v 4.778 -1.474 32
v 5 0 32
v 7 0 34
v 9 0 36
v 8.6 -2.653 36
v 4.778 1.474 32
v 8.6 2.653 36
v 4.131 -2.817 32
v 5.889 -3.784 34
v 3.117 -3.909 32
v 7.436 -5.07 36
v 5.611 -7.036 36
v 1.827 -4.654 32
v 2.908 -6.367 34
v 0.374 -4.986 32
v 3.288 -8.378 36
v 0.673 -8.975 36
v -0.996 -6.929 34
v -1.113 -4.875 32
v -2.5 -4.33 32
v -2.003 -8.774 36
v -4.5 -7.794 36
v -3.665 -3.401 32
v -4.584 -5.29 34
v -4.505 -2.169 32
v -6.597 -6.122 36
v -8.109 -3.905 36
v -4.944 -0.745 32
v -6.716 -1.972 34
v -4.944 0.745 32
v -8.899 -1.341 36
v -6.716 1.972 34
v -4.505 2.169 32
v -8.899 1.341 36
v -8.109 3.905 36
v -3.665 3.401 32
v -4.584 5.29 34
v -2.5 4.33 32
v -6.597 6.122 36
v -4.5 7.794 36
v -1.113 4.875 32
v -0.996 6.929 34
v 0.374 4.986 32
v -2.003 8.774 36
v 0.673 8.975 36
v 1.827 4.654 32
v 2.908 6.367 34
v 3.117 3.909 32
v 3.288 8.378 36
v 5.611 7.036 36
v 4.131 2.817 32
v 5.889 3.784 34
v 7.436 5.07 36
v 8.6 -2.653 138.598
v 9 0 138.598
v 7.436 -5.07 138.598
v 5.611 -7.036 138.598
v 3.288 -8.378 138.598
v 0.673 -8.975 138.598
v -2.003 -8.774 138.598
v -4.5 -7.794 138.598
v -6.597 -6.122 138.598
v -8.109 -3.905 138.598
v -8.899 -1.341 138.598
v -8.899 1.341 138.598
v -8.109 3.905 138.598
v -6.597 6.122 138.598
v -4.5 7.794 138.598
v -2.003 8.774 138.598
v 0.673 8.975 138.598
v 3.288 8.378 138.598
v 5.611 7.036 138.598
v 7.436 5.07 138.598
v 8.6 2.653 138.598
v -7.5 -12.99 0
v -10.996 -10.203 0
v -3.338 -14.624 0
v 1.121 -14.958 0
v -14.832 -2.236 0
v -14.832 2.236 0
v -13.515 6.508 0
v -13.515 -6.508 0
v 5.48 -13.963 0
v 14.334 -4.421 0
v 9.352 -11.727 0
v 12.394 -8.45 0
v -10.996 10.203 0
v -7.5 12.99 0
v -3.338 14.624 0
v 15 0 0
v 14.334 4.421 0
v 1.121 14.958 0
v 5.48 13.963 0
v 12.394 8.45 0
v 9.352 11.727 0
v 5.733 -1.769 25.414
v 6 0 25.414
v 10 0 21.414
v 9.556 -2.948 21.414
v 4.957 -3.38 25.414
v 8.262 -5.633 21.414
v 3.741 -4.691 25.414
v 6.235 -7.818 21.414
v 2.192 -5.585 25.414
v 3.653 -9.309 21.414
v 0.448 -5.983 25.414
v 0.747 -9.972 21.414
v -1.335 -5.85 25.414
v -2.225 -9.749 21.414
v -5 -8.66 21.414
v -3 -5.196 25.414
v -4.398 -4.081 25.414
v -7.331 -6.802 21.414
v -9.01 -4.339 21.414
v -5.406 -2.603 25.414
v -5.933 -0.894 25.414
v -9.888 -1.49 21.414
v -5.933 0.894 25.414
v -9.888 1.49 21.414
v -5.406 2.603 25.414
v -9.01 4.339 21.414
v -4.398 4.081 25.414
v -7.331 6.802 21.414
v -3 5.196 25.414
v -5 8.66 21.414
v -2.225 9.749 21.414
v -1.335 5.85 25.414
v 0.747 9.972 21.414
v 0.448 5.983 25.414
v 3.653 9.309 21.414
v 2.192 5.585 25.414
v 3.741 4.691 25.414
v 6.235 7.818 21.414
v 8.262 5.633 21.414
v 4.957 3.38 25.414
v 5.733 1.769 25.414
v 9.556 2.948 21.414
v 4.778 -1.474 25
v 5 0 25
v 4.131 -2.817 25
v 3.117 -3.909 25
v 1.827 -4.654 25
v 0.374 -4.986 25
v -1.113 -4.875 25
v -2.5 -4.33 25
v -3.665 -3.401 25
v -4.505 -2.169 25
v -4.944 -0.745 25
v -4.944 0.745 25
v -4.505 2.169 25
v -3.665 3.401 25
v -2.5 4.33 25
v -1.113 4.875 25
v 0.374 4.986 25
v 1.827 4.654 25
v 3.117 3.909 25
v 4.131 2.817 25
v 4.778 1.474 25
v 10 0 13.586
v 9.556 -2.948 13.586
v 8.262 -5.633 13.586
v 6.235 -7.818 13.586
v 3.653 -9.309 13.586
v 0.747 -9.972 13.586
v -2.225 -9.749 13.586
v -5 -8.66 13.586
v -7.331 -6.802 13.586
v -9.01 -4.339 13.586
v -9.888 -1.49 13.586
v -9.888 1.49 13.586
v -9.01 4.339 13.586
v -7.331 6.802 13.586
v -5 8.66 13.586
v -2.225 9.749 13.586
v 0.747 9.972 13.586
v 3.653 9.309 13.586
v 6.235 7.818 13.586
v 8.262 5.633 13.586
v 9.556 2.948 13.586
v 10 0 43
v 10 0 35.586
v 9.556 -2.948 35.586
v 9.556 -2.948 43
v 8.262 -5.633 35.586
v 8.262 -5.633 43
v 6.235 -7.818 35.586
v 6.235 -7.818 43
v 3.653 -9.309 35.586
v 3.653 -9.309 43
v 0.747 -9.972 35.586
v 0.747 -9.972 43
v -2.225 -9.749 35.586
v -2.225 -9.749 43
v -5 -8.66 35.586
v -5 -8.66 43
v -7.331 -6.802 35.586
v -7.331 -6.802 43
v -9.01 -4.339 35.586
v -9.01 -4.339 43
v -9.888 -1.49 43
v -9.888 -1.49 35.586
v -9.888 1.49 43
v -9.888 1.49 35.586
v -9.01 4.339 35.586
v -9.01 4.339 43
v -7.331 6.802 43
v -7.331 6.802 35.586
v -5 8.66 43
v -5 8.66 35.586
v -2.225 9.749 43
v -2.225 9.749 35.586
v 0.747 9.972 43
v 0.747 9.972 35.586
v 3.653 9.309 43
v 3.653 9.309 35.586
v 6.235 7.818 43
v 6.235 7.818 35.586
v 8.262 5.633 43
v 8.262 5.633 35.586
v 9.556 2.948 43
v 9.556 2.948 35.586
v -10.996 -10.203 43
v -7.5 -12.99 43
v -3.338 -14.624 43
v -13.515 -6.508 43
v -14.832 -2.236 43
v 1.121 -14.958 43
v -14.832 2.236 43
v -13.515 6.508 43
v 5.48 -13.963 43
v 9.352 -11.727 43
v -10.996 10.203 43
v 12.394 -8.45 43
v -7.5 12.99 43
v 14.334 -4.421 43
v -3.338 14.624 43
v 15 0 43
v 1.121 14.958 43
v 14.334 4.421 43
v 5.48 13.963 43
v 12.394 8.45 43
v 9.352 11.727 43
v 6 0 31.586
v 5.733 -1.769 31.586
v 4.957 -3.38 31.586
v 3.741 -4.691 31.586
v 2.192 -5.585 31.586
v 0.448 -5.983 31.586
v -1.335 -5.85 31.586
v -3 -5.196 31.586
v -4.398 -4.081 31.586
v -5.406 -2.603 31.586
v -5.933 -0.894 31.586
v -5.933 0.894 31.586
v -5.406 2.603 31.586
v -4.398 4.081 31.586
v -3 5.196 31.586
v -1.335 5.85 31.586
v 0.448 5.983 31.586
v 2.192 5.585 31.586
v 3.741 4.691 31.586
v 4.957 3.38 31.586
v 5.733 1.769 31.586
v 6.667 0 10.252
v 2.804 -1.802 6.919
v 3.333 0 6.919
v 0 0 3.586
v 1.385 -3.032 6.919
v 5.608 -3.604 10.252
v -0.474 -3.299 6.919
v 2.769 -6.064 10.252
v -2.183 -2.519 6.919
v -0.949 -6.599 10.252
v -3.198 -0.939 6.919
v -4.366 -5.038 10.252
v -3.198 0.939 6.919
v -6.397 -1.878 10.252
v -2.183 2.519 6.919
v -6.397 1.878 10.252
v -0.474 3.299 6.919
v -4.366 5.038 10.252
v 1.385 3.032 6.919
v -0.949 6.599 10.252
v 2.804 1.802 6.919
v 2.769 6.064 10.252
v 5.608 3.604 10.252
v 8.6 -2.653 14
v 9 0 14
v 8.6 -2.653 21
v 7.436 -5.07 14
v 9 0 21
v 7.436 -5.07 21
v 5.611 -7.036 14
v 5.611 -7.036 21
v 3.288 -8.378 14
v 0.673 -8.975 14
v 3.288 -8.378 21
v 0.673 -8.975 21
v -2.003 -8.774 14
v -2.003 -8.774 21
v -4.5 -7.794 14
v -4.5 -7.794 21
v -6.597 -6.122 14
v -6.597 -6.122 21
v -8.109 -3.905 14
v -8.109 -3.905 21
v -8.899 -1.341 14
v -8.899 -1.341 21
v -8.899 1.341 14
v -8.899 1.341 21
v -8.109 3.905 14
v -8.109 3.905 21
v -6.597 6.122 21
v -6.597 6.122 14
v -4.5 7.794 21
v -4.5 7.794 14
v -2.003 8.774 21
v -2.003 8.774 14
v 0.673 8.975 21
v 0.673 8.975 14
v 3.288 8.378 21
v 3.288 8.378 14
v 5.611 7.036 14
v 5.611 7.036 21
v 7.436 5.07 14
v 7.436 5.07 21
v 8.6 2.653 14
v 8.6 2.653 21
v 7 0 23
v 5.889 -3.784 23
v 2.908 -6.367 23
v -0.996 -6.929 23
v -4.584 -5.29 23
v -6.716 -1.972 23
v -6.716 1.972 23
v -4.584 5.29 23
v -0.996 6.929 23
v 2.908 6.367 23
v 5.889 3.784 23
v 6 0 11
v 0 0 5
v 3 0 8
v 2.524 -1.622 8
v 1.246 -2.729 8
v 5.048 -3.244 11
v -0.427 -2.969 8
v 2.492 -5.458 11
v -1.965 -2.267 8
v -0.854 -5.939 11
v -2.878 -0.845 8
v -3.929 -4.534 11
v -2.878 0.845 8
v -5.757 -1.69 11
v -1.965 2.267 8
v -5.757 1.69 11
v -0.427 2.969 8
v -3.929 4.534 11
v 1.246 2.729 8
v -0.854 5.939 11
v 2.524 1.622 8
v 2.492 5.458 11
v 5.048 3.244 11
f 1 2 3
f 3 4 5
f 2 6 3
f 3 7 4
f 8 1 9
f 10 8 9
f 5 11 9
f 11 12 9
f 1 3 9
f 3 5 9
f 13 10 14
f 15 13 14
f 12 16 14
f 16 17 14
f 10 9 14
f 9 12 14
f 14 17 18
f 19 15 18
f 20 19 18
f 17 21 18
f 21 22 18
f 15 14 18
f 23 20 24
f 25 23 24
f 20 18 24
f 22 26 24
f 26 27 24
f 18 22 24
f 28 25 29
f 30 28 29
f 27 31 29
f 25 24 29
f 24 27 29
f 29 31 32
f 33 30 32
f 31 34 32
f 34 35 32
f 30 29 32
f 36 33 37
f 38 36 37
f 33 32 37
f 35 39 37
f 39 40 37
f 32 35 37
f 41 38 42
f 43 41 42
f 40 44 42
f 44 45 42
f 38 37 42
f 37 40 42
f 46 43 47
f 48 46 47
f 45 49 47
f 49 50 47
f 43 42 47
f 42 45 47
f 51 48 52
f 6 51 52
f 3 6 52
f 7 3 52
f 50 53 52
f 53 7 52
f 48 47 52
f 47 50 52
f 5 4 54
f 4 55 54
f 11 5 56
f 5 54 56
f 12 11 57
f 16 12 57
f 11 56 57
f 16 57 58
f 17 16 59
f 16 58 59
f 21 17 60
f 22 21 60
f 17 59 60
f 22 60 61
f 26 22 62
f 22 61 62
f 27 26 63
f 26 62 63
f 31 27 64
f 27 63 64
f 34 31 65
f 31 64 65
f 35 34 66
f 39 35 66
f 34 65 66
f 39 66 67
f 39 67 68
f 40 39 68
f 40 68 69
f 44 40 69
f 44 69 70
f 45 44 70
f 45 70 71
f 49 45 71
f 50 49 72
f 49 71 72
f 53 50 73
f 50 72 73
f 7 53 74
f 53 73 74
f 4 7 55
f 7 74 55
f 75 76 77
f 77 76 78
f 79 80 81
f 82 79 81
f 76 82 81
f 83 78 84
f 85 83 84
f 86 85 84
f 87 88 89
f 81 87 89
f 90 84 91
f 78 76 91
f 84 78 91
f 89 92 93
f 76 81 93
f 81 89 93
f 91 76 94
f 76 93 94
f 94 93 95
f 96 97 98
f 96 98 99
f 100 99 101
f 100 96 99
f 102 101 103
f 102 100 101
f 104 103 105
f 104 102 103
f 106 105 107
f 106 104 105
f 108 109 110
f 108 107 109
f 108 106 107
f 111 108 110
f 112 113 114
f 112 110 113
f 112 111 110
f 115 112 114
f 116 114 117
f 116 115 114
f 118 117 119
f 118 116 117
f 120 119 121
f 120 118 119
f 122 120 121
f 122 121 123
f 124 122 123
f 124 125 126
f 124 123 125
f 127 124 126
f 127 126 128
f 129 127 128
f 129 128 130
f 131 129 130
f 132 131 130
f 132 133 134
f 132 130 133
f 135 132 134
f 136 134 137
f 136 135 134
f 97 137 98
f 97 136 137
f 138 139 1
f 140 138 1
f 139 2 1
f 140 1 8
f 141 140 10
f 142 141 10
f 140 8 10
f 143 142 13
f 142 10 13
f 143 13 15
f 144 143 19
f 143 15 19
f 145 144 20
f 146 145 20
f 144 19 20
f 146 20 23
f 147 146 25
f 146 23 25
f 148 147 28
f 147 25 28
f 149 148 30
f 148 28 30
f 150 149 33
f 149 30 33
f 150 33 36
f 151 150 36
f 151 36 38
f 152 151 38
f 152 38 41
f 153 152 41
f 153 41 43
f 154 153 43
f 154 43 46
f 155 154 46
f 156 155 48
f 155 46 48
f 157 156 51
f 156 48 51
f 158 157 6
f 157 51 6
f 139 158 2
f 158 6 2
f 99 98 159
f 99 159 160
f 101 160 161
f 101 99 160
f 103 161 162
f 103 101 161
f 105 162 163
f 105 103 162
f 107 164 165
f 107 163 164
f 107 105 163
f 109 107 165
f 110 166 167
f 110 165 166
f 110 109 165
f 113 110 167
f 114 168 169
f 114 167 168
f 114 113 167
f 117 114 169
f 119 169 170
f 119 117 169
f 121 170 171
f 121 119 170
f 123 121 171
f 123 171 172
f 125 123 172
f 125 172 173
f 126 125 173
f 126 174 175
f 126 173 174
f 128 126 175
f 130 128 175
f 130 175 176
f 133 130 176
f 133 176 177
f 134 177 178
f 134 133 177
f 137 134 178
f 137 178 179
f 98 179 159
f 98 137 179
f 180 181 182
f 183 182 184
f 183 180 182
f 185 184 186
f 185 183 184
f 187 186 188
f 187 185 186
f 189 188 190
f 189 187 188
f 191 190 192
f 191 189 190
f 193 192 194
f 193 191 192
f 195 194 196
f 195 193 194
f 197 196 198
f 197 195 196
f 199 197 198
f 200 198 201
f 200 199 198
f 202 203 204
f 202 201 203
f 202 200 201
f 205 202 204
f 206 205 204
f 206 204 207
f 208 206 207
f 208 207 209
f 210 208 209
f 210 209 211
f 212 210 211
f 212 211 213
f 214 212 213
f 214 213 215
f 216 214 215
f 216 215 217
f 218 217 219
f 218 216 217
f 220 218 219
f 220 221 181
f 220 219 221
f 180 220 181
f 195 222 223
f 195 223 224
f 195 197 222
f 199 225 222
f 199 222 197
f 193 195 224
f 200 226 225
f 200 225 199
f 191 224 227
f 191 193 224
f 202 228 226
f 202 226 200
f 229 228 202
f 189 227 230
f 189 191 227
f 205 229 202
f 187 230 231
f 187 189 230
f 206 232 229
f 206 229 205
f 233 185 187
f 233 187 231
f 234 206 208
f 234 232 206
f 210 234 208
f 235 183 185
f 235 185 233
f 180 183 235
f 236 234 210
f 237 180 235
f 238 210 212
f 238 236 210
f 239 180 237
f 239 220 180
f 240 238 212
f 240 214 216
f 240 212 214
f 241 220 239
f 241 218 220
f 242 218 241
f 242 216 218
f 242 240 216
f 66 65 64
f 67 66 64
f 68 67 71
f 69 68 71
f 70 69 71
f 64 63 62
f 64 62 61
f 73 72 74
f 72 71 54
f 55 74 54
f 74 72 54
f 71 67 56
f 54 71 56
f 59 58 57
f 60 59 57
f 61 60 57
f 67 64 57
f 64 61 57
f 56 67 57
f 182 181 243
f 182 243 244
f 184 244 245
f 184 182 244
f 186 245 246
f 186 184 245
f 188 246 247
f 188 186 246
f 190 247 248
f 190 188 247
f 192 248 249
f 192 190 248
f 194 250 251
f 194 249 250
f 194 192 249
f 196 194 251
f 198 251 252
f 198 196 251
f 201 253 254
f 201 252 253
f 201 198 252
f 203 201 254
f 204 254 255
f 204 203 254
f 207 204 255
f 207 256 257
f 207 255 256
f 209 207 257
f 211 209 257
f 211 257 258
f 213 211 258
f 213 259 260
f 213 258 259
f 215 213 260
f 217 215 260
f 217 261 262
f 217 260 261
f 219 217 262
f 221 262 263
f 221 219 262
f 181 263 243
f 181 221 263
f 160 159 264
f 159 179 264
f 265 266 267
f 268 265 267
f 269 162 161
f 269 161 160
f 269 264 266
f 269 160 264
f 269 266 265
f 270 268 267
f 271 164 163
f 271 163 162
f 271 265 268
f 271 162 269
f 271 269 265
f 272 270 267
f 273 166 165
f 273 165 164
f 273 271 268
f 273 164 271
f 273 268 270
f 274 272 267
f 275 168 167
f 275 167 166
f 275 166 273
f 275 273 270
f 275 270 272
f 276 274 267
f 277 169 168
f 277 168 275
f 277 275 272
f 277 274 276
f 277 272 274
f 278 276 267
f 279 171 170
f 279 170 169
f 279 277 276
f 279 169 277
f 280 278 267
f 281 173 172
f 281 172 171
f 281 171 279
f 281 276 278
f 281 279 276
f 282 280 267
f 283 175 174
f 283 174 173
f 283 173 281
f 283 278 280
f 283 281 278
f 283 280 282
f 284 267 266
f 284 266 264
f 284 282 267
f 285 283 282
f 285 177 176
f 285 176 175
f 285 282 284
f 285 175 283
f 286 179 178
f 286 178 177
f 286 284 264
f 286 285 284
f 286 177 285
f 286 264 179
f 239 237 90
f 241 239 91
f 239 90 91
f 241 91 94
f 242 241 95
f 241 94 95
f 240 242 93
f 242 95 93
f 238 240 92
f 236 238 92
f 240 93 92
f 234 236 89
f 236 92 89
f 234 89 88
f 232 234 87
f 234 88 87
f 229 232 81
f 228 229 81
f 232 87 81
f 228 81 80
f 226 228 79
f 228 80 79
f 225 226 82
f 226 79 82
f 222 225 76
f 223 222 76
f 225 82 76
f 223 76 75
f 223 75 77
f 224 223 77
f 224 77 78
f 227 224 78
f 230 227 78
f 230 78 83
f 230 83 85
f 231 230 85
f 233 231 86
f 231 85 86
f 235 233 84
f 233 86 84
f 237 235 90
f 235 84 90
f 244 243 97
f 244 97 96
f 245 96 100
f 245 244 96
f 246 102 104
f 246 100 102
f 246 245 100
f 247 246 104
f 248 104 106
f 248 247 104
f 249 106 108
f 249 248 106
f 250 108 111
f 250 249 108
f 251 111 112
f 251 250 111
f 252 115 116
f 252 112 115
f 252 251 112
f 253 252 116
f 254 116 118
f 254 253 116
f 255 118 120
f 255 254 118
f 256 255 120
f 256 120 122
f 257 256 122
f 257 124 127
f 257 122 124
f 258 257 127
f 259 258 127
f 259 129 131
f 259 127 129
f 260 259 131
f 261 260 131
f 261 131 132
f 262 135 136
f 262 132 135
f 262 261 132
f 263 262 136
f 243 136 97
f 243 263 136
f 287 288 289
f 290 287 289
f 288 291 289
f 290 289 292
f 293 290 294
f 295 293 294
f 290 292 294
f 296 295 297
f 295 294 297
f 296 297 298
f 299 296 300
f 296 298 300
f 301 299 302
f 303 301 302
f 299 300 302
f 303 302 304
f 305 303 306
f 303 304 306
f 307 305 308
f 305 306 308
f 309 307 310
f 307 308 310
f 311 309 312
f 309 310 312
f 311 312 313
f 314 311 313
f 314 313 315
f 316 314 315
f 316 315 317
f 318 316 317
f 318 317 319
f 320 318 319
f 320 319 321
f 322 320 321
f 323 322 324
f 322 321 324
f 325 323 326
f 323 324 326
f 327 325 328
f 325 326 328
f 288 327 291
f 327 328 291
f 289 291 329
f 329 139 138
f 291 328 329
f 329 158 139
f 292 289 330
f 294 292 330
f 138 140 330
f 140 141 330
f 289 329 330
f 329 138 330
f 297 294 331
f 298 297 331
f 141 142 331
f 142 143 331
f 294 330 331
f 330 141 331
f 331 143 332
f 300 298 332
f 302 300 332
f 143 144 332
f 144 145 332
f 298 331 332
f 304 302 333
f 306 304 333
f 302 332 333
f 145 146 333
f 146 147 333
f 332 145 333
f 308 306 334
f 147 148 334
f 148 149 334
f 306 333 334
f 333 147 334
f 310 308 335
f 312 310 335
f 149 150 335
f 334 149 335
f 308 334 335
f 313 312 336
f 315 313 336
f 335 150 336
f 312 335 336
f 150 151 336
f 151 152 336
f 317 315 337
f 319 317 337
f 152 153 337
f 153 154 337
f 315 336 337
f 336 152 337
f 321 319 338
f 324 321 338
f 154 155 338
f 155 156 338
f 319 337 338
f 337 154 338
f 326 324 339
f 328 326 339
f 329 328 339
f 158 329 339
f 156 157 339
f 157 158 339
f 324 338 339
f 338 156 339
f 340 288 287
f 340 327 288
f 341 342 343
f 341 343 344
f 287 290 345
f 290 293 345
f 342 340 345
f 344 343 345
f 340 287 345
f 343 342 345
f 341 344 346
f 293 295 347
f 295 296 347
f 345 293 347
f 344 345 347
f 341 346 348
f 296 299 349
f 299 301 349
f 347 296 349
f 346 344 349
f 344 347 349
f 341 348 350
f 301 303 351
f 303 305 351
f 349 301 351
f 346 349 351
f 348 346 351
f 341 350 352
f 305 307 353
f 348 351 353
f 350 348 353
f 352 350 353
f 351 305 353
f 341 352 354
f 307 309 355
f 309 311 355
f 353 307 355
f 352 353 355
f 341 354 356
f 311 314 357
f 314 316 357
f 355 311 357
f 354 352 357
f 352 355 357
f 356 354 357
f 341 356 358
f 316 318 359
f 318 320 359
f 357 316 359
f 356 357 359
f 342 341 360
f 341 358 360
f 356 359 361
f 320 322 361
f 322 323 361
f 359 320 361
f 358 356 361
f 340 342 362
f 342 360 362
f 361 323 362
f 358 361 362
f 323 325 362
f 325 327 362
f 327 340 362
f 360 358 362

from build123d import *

# Parameters (mm, degrees)
F1_R      = 15
F2_DEPTH  = 43
F5_OFFSET = 1


with BuildPart() as f2:
    # F1 (on Top) → F2 (new body)
    with BuildSketch(Plane.XY):
        Circle(F1_R)
    extrude(amount=F2_DEPTH)


with BuildPart() as f4:
    # F3 (on Front) → F4 (revolve)
    with BuildSketch(Plane.XZ):
        Polygon((0, 138.5983246118), (0, 5), (9, 14), (9, 21), (5, 25), (5, 32), (9, 36), (9, 138.5983246118), (5, 138.5983246118), align=None)
    revolve(axis=Axis((0, 0, 71.7991623059), (0, 0, -1)))


with BuildPart() as f2_1:
    add(f2.part)

    # F5: cut F4, made larger all round first
    f5_tool = offset(f4.part, amount=F5_OFFSET, kind=Kind.INTERSECTION, mode=Mode.PRIVATE)
    add(f5_tool, mode=Mode.SUBTRACT)


solid = Compound([f4.part, f2_1.part])
